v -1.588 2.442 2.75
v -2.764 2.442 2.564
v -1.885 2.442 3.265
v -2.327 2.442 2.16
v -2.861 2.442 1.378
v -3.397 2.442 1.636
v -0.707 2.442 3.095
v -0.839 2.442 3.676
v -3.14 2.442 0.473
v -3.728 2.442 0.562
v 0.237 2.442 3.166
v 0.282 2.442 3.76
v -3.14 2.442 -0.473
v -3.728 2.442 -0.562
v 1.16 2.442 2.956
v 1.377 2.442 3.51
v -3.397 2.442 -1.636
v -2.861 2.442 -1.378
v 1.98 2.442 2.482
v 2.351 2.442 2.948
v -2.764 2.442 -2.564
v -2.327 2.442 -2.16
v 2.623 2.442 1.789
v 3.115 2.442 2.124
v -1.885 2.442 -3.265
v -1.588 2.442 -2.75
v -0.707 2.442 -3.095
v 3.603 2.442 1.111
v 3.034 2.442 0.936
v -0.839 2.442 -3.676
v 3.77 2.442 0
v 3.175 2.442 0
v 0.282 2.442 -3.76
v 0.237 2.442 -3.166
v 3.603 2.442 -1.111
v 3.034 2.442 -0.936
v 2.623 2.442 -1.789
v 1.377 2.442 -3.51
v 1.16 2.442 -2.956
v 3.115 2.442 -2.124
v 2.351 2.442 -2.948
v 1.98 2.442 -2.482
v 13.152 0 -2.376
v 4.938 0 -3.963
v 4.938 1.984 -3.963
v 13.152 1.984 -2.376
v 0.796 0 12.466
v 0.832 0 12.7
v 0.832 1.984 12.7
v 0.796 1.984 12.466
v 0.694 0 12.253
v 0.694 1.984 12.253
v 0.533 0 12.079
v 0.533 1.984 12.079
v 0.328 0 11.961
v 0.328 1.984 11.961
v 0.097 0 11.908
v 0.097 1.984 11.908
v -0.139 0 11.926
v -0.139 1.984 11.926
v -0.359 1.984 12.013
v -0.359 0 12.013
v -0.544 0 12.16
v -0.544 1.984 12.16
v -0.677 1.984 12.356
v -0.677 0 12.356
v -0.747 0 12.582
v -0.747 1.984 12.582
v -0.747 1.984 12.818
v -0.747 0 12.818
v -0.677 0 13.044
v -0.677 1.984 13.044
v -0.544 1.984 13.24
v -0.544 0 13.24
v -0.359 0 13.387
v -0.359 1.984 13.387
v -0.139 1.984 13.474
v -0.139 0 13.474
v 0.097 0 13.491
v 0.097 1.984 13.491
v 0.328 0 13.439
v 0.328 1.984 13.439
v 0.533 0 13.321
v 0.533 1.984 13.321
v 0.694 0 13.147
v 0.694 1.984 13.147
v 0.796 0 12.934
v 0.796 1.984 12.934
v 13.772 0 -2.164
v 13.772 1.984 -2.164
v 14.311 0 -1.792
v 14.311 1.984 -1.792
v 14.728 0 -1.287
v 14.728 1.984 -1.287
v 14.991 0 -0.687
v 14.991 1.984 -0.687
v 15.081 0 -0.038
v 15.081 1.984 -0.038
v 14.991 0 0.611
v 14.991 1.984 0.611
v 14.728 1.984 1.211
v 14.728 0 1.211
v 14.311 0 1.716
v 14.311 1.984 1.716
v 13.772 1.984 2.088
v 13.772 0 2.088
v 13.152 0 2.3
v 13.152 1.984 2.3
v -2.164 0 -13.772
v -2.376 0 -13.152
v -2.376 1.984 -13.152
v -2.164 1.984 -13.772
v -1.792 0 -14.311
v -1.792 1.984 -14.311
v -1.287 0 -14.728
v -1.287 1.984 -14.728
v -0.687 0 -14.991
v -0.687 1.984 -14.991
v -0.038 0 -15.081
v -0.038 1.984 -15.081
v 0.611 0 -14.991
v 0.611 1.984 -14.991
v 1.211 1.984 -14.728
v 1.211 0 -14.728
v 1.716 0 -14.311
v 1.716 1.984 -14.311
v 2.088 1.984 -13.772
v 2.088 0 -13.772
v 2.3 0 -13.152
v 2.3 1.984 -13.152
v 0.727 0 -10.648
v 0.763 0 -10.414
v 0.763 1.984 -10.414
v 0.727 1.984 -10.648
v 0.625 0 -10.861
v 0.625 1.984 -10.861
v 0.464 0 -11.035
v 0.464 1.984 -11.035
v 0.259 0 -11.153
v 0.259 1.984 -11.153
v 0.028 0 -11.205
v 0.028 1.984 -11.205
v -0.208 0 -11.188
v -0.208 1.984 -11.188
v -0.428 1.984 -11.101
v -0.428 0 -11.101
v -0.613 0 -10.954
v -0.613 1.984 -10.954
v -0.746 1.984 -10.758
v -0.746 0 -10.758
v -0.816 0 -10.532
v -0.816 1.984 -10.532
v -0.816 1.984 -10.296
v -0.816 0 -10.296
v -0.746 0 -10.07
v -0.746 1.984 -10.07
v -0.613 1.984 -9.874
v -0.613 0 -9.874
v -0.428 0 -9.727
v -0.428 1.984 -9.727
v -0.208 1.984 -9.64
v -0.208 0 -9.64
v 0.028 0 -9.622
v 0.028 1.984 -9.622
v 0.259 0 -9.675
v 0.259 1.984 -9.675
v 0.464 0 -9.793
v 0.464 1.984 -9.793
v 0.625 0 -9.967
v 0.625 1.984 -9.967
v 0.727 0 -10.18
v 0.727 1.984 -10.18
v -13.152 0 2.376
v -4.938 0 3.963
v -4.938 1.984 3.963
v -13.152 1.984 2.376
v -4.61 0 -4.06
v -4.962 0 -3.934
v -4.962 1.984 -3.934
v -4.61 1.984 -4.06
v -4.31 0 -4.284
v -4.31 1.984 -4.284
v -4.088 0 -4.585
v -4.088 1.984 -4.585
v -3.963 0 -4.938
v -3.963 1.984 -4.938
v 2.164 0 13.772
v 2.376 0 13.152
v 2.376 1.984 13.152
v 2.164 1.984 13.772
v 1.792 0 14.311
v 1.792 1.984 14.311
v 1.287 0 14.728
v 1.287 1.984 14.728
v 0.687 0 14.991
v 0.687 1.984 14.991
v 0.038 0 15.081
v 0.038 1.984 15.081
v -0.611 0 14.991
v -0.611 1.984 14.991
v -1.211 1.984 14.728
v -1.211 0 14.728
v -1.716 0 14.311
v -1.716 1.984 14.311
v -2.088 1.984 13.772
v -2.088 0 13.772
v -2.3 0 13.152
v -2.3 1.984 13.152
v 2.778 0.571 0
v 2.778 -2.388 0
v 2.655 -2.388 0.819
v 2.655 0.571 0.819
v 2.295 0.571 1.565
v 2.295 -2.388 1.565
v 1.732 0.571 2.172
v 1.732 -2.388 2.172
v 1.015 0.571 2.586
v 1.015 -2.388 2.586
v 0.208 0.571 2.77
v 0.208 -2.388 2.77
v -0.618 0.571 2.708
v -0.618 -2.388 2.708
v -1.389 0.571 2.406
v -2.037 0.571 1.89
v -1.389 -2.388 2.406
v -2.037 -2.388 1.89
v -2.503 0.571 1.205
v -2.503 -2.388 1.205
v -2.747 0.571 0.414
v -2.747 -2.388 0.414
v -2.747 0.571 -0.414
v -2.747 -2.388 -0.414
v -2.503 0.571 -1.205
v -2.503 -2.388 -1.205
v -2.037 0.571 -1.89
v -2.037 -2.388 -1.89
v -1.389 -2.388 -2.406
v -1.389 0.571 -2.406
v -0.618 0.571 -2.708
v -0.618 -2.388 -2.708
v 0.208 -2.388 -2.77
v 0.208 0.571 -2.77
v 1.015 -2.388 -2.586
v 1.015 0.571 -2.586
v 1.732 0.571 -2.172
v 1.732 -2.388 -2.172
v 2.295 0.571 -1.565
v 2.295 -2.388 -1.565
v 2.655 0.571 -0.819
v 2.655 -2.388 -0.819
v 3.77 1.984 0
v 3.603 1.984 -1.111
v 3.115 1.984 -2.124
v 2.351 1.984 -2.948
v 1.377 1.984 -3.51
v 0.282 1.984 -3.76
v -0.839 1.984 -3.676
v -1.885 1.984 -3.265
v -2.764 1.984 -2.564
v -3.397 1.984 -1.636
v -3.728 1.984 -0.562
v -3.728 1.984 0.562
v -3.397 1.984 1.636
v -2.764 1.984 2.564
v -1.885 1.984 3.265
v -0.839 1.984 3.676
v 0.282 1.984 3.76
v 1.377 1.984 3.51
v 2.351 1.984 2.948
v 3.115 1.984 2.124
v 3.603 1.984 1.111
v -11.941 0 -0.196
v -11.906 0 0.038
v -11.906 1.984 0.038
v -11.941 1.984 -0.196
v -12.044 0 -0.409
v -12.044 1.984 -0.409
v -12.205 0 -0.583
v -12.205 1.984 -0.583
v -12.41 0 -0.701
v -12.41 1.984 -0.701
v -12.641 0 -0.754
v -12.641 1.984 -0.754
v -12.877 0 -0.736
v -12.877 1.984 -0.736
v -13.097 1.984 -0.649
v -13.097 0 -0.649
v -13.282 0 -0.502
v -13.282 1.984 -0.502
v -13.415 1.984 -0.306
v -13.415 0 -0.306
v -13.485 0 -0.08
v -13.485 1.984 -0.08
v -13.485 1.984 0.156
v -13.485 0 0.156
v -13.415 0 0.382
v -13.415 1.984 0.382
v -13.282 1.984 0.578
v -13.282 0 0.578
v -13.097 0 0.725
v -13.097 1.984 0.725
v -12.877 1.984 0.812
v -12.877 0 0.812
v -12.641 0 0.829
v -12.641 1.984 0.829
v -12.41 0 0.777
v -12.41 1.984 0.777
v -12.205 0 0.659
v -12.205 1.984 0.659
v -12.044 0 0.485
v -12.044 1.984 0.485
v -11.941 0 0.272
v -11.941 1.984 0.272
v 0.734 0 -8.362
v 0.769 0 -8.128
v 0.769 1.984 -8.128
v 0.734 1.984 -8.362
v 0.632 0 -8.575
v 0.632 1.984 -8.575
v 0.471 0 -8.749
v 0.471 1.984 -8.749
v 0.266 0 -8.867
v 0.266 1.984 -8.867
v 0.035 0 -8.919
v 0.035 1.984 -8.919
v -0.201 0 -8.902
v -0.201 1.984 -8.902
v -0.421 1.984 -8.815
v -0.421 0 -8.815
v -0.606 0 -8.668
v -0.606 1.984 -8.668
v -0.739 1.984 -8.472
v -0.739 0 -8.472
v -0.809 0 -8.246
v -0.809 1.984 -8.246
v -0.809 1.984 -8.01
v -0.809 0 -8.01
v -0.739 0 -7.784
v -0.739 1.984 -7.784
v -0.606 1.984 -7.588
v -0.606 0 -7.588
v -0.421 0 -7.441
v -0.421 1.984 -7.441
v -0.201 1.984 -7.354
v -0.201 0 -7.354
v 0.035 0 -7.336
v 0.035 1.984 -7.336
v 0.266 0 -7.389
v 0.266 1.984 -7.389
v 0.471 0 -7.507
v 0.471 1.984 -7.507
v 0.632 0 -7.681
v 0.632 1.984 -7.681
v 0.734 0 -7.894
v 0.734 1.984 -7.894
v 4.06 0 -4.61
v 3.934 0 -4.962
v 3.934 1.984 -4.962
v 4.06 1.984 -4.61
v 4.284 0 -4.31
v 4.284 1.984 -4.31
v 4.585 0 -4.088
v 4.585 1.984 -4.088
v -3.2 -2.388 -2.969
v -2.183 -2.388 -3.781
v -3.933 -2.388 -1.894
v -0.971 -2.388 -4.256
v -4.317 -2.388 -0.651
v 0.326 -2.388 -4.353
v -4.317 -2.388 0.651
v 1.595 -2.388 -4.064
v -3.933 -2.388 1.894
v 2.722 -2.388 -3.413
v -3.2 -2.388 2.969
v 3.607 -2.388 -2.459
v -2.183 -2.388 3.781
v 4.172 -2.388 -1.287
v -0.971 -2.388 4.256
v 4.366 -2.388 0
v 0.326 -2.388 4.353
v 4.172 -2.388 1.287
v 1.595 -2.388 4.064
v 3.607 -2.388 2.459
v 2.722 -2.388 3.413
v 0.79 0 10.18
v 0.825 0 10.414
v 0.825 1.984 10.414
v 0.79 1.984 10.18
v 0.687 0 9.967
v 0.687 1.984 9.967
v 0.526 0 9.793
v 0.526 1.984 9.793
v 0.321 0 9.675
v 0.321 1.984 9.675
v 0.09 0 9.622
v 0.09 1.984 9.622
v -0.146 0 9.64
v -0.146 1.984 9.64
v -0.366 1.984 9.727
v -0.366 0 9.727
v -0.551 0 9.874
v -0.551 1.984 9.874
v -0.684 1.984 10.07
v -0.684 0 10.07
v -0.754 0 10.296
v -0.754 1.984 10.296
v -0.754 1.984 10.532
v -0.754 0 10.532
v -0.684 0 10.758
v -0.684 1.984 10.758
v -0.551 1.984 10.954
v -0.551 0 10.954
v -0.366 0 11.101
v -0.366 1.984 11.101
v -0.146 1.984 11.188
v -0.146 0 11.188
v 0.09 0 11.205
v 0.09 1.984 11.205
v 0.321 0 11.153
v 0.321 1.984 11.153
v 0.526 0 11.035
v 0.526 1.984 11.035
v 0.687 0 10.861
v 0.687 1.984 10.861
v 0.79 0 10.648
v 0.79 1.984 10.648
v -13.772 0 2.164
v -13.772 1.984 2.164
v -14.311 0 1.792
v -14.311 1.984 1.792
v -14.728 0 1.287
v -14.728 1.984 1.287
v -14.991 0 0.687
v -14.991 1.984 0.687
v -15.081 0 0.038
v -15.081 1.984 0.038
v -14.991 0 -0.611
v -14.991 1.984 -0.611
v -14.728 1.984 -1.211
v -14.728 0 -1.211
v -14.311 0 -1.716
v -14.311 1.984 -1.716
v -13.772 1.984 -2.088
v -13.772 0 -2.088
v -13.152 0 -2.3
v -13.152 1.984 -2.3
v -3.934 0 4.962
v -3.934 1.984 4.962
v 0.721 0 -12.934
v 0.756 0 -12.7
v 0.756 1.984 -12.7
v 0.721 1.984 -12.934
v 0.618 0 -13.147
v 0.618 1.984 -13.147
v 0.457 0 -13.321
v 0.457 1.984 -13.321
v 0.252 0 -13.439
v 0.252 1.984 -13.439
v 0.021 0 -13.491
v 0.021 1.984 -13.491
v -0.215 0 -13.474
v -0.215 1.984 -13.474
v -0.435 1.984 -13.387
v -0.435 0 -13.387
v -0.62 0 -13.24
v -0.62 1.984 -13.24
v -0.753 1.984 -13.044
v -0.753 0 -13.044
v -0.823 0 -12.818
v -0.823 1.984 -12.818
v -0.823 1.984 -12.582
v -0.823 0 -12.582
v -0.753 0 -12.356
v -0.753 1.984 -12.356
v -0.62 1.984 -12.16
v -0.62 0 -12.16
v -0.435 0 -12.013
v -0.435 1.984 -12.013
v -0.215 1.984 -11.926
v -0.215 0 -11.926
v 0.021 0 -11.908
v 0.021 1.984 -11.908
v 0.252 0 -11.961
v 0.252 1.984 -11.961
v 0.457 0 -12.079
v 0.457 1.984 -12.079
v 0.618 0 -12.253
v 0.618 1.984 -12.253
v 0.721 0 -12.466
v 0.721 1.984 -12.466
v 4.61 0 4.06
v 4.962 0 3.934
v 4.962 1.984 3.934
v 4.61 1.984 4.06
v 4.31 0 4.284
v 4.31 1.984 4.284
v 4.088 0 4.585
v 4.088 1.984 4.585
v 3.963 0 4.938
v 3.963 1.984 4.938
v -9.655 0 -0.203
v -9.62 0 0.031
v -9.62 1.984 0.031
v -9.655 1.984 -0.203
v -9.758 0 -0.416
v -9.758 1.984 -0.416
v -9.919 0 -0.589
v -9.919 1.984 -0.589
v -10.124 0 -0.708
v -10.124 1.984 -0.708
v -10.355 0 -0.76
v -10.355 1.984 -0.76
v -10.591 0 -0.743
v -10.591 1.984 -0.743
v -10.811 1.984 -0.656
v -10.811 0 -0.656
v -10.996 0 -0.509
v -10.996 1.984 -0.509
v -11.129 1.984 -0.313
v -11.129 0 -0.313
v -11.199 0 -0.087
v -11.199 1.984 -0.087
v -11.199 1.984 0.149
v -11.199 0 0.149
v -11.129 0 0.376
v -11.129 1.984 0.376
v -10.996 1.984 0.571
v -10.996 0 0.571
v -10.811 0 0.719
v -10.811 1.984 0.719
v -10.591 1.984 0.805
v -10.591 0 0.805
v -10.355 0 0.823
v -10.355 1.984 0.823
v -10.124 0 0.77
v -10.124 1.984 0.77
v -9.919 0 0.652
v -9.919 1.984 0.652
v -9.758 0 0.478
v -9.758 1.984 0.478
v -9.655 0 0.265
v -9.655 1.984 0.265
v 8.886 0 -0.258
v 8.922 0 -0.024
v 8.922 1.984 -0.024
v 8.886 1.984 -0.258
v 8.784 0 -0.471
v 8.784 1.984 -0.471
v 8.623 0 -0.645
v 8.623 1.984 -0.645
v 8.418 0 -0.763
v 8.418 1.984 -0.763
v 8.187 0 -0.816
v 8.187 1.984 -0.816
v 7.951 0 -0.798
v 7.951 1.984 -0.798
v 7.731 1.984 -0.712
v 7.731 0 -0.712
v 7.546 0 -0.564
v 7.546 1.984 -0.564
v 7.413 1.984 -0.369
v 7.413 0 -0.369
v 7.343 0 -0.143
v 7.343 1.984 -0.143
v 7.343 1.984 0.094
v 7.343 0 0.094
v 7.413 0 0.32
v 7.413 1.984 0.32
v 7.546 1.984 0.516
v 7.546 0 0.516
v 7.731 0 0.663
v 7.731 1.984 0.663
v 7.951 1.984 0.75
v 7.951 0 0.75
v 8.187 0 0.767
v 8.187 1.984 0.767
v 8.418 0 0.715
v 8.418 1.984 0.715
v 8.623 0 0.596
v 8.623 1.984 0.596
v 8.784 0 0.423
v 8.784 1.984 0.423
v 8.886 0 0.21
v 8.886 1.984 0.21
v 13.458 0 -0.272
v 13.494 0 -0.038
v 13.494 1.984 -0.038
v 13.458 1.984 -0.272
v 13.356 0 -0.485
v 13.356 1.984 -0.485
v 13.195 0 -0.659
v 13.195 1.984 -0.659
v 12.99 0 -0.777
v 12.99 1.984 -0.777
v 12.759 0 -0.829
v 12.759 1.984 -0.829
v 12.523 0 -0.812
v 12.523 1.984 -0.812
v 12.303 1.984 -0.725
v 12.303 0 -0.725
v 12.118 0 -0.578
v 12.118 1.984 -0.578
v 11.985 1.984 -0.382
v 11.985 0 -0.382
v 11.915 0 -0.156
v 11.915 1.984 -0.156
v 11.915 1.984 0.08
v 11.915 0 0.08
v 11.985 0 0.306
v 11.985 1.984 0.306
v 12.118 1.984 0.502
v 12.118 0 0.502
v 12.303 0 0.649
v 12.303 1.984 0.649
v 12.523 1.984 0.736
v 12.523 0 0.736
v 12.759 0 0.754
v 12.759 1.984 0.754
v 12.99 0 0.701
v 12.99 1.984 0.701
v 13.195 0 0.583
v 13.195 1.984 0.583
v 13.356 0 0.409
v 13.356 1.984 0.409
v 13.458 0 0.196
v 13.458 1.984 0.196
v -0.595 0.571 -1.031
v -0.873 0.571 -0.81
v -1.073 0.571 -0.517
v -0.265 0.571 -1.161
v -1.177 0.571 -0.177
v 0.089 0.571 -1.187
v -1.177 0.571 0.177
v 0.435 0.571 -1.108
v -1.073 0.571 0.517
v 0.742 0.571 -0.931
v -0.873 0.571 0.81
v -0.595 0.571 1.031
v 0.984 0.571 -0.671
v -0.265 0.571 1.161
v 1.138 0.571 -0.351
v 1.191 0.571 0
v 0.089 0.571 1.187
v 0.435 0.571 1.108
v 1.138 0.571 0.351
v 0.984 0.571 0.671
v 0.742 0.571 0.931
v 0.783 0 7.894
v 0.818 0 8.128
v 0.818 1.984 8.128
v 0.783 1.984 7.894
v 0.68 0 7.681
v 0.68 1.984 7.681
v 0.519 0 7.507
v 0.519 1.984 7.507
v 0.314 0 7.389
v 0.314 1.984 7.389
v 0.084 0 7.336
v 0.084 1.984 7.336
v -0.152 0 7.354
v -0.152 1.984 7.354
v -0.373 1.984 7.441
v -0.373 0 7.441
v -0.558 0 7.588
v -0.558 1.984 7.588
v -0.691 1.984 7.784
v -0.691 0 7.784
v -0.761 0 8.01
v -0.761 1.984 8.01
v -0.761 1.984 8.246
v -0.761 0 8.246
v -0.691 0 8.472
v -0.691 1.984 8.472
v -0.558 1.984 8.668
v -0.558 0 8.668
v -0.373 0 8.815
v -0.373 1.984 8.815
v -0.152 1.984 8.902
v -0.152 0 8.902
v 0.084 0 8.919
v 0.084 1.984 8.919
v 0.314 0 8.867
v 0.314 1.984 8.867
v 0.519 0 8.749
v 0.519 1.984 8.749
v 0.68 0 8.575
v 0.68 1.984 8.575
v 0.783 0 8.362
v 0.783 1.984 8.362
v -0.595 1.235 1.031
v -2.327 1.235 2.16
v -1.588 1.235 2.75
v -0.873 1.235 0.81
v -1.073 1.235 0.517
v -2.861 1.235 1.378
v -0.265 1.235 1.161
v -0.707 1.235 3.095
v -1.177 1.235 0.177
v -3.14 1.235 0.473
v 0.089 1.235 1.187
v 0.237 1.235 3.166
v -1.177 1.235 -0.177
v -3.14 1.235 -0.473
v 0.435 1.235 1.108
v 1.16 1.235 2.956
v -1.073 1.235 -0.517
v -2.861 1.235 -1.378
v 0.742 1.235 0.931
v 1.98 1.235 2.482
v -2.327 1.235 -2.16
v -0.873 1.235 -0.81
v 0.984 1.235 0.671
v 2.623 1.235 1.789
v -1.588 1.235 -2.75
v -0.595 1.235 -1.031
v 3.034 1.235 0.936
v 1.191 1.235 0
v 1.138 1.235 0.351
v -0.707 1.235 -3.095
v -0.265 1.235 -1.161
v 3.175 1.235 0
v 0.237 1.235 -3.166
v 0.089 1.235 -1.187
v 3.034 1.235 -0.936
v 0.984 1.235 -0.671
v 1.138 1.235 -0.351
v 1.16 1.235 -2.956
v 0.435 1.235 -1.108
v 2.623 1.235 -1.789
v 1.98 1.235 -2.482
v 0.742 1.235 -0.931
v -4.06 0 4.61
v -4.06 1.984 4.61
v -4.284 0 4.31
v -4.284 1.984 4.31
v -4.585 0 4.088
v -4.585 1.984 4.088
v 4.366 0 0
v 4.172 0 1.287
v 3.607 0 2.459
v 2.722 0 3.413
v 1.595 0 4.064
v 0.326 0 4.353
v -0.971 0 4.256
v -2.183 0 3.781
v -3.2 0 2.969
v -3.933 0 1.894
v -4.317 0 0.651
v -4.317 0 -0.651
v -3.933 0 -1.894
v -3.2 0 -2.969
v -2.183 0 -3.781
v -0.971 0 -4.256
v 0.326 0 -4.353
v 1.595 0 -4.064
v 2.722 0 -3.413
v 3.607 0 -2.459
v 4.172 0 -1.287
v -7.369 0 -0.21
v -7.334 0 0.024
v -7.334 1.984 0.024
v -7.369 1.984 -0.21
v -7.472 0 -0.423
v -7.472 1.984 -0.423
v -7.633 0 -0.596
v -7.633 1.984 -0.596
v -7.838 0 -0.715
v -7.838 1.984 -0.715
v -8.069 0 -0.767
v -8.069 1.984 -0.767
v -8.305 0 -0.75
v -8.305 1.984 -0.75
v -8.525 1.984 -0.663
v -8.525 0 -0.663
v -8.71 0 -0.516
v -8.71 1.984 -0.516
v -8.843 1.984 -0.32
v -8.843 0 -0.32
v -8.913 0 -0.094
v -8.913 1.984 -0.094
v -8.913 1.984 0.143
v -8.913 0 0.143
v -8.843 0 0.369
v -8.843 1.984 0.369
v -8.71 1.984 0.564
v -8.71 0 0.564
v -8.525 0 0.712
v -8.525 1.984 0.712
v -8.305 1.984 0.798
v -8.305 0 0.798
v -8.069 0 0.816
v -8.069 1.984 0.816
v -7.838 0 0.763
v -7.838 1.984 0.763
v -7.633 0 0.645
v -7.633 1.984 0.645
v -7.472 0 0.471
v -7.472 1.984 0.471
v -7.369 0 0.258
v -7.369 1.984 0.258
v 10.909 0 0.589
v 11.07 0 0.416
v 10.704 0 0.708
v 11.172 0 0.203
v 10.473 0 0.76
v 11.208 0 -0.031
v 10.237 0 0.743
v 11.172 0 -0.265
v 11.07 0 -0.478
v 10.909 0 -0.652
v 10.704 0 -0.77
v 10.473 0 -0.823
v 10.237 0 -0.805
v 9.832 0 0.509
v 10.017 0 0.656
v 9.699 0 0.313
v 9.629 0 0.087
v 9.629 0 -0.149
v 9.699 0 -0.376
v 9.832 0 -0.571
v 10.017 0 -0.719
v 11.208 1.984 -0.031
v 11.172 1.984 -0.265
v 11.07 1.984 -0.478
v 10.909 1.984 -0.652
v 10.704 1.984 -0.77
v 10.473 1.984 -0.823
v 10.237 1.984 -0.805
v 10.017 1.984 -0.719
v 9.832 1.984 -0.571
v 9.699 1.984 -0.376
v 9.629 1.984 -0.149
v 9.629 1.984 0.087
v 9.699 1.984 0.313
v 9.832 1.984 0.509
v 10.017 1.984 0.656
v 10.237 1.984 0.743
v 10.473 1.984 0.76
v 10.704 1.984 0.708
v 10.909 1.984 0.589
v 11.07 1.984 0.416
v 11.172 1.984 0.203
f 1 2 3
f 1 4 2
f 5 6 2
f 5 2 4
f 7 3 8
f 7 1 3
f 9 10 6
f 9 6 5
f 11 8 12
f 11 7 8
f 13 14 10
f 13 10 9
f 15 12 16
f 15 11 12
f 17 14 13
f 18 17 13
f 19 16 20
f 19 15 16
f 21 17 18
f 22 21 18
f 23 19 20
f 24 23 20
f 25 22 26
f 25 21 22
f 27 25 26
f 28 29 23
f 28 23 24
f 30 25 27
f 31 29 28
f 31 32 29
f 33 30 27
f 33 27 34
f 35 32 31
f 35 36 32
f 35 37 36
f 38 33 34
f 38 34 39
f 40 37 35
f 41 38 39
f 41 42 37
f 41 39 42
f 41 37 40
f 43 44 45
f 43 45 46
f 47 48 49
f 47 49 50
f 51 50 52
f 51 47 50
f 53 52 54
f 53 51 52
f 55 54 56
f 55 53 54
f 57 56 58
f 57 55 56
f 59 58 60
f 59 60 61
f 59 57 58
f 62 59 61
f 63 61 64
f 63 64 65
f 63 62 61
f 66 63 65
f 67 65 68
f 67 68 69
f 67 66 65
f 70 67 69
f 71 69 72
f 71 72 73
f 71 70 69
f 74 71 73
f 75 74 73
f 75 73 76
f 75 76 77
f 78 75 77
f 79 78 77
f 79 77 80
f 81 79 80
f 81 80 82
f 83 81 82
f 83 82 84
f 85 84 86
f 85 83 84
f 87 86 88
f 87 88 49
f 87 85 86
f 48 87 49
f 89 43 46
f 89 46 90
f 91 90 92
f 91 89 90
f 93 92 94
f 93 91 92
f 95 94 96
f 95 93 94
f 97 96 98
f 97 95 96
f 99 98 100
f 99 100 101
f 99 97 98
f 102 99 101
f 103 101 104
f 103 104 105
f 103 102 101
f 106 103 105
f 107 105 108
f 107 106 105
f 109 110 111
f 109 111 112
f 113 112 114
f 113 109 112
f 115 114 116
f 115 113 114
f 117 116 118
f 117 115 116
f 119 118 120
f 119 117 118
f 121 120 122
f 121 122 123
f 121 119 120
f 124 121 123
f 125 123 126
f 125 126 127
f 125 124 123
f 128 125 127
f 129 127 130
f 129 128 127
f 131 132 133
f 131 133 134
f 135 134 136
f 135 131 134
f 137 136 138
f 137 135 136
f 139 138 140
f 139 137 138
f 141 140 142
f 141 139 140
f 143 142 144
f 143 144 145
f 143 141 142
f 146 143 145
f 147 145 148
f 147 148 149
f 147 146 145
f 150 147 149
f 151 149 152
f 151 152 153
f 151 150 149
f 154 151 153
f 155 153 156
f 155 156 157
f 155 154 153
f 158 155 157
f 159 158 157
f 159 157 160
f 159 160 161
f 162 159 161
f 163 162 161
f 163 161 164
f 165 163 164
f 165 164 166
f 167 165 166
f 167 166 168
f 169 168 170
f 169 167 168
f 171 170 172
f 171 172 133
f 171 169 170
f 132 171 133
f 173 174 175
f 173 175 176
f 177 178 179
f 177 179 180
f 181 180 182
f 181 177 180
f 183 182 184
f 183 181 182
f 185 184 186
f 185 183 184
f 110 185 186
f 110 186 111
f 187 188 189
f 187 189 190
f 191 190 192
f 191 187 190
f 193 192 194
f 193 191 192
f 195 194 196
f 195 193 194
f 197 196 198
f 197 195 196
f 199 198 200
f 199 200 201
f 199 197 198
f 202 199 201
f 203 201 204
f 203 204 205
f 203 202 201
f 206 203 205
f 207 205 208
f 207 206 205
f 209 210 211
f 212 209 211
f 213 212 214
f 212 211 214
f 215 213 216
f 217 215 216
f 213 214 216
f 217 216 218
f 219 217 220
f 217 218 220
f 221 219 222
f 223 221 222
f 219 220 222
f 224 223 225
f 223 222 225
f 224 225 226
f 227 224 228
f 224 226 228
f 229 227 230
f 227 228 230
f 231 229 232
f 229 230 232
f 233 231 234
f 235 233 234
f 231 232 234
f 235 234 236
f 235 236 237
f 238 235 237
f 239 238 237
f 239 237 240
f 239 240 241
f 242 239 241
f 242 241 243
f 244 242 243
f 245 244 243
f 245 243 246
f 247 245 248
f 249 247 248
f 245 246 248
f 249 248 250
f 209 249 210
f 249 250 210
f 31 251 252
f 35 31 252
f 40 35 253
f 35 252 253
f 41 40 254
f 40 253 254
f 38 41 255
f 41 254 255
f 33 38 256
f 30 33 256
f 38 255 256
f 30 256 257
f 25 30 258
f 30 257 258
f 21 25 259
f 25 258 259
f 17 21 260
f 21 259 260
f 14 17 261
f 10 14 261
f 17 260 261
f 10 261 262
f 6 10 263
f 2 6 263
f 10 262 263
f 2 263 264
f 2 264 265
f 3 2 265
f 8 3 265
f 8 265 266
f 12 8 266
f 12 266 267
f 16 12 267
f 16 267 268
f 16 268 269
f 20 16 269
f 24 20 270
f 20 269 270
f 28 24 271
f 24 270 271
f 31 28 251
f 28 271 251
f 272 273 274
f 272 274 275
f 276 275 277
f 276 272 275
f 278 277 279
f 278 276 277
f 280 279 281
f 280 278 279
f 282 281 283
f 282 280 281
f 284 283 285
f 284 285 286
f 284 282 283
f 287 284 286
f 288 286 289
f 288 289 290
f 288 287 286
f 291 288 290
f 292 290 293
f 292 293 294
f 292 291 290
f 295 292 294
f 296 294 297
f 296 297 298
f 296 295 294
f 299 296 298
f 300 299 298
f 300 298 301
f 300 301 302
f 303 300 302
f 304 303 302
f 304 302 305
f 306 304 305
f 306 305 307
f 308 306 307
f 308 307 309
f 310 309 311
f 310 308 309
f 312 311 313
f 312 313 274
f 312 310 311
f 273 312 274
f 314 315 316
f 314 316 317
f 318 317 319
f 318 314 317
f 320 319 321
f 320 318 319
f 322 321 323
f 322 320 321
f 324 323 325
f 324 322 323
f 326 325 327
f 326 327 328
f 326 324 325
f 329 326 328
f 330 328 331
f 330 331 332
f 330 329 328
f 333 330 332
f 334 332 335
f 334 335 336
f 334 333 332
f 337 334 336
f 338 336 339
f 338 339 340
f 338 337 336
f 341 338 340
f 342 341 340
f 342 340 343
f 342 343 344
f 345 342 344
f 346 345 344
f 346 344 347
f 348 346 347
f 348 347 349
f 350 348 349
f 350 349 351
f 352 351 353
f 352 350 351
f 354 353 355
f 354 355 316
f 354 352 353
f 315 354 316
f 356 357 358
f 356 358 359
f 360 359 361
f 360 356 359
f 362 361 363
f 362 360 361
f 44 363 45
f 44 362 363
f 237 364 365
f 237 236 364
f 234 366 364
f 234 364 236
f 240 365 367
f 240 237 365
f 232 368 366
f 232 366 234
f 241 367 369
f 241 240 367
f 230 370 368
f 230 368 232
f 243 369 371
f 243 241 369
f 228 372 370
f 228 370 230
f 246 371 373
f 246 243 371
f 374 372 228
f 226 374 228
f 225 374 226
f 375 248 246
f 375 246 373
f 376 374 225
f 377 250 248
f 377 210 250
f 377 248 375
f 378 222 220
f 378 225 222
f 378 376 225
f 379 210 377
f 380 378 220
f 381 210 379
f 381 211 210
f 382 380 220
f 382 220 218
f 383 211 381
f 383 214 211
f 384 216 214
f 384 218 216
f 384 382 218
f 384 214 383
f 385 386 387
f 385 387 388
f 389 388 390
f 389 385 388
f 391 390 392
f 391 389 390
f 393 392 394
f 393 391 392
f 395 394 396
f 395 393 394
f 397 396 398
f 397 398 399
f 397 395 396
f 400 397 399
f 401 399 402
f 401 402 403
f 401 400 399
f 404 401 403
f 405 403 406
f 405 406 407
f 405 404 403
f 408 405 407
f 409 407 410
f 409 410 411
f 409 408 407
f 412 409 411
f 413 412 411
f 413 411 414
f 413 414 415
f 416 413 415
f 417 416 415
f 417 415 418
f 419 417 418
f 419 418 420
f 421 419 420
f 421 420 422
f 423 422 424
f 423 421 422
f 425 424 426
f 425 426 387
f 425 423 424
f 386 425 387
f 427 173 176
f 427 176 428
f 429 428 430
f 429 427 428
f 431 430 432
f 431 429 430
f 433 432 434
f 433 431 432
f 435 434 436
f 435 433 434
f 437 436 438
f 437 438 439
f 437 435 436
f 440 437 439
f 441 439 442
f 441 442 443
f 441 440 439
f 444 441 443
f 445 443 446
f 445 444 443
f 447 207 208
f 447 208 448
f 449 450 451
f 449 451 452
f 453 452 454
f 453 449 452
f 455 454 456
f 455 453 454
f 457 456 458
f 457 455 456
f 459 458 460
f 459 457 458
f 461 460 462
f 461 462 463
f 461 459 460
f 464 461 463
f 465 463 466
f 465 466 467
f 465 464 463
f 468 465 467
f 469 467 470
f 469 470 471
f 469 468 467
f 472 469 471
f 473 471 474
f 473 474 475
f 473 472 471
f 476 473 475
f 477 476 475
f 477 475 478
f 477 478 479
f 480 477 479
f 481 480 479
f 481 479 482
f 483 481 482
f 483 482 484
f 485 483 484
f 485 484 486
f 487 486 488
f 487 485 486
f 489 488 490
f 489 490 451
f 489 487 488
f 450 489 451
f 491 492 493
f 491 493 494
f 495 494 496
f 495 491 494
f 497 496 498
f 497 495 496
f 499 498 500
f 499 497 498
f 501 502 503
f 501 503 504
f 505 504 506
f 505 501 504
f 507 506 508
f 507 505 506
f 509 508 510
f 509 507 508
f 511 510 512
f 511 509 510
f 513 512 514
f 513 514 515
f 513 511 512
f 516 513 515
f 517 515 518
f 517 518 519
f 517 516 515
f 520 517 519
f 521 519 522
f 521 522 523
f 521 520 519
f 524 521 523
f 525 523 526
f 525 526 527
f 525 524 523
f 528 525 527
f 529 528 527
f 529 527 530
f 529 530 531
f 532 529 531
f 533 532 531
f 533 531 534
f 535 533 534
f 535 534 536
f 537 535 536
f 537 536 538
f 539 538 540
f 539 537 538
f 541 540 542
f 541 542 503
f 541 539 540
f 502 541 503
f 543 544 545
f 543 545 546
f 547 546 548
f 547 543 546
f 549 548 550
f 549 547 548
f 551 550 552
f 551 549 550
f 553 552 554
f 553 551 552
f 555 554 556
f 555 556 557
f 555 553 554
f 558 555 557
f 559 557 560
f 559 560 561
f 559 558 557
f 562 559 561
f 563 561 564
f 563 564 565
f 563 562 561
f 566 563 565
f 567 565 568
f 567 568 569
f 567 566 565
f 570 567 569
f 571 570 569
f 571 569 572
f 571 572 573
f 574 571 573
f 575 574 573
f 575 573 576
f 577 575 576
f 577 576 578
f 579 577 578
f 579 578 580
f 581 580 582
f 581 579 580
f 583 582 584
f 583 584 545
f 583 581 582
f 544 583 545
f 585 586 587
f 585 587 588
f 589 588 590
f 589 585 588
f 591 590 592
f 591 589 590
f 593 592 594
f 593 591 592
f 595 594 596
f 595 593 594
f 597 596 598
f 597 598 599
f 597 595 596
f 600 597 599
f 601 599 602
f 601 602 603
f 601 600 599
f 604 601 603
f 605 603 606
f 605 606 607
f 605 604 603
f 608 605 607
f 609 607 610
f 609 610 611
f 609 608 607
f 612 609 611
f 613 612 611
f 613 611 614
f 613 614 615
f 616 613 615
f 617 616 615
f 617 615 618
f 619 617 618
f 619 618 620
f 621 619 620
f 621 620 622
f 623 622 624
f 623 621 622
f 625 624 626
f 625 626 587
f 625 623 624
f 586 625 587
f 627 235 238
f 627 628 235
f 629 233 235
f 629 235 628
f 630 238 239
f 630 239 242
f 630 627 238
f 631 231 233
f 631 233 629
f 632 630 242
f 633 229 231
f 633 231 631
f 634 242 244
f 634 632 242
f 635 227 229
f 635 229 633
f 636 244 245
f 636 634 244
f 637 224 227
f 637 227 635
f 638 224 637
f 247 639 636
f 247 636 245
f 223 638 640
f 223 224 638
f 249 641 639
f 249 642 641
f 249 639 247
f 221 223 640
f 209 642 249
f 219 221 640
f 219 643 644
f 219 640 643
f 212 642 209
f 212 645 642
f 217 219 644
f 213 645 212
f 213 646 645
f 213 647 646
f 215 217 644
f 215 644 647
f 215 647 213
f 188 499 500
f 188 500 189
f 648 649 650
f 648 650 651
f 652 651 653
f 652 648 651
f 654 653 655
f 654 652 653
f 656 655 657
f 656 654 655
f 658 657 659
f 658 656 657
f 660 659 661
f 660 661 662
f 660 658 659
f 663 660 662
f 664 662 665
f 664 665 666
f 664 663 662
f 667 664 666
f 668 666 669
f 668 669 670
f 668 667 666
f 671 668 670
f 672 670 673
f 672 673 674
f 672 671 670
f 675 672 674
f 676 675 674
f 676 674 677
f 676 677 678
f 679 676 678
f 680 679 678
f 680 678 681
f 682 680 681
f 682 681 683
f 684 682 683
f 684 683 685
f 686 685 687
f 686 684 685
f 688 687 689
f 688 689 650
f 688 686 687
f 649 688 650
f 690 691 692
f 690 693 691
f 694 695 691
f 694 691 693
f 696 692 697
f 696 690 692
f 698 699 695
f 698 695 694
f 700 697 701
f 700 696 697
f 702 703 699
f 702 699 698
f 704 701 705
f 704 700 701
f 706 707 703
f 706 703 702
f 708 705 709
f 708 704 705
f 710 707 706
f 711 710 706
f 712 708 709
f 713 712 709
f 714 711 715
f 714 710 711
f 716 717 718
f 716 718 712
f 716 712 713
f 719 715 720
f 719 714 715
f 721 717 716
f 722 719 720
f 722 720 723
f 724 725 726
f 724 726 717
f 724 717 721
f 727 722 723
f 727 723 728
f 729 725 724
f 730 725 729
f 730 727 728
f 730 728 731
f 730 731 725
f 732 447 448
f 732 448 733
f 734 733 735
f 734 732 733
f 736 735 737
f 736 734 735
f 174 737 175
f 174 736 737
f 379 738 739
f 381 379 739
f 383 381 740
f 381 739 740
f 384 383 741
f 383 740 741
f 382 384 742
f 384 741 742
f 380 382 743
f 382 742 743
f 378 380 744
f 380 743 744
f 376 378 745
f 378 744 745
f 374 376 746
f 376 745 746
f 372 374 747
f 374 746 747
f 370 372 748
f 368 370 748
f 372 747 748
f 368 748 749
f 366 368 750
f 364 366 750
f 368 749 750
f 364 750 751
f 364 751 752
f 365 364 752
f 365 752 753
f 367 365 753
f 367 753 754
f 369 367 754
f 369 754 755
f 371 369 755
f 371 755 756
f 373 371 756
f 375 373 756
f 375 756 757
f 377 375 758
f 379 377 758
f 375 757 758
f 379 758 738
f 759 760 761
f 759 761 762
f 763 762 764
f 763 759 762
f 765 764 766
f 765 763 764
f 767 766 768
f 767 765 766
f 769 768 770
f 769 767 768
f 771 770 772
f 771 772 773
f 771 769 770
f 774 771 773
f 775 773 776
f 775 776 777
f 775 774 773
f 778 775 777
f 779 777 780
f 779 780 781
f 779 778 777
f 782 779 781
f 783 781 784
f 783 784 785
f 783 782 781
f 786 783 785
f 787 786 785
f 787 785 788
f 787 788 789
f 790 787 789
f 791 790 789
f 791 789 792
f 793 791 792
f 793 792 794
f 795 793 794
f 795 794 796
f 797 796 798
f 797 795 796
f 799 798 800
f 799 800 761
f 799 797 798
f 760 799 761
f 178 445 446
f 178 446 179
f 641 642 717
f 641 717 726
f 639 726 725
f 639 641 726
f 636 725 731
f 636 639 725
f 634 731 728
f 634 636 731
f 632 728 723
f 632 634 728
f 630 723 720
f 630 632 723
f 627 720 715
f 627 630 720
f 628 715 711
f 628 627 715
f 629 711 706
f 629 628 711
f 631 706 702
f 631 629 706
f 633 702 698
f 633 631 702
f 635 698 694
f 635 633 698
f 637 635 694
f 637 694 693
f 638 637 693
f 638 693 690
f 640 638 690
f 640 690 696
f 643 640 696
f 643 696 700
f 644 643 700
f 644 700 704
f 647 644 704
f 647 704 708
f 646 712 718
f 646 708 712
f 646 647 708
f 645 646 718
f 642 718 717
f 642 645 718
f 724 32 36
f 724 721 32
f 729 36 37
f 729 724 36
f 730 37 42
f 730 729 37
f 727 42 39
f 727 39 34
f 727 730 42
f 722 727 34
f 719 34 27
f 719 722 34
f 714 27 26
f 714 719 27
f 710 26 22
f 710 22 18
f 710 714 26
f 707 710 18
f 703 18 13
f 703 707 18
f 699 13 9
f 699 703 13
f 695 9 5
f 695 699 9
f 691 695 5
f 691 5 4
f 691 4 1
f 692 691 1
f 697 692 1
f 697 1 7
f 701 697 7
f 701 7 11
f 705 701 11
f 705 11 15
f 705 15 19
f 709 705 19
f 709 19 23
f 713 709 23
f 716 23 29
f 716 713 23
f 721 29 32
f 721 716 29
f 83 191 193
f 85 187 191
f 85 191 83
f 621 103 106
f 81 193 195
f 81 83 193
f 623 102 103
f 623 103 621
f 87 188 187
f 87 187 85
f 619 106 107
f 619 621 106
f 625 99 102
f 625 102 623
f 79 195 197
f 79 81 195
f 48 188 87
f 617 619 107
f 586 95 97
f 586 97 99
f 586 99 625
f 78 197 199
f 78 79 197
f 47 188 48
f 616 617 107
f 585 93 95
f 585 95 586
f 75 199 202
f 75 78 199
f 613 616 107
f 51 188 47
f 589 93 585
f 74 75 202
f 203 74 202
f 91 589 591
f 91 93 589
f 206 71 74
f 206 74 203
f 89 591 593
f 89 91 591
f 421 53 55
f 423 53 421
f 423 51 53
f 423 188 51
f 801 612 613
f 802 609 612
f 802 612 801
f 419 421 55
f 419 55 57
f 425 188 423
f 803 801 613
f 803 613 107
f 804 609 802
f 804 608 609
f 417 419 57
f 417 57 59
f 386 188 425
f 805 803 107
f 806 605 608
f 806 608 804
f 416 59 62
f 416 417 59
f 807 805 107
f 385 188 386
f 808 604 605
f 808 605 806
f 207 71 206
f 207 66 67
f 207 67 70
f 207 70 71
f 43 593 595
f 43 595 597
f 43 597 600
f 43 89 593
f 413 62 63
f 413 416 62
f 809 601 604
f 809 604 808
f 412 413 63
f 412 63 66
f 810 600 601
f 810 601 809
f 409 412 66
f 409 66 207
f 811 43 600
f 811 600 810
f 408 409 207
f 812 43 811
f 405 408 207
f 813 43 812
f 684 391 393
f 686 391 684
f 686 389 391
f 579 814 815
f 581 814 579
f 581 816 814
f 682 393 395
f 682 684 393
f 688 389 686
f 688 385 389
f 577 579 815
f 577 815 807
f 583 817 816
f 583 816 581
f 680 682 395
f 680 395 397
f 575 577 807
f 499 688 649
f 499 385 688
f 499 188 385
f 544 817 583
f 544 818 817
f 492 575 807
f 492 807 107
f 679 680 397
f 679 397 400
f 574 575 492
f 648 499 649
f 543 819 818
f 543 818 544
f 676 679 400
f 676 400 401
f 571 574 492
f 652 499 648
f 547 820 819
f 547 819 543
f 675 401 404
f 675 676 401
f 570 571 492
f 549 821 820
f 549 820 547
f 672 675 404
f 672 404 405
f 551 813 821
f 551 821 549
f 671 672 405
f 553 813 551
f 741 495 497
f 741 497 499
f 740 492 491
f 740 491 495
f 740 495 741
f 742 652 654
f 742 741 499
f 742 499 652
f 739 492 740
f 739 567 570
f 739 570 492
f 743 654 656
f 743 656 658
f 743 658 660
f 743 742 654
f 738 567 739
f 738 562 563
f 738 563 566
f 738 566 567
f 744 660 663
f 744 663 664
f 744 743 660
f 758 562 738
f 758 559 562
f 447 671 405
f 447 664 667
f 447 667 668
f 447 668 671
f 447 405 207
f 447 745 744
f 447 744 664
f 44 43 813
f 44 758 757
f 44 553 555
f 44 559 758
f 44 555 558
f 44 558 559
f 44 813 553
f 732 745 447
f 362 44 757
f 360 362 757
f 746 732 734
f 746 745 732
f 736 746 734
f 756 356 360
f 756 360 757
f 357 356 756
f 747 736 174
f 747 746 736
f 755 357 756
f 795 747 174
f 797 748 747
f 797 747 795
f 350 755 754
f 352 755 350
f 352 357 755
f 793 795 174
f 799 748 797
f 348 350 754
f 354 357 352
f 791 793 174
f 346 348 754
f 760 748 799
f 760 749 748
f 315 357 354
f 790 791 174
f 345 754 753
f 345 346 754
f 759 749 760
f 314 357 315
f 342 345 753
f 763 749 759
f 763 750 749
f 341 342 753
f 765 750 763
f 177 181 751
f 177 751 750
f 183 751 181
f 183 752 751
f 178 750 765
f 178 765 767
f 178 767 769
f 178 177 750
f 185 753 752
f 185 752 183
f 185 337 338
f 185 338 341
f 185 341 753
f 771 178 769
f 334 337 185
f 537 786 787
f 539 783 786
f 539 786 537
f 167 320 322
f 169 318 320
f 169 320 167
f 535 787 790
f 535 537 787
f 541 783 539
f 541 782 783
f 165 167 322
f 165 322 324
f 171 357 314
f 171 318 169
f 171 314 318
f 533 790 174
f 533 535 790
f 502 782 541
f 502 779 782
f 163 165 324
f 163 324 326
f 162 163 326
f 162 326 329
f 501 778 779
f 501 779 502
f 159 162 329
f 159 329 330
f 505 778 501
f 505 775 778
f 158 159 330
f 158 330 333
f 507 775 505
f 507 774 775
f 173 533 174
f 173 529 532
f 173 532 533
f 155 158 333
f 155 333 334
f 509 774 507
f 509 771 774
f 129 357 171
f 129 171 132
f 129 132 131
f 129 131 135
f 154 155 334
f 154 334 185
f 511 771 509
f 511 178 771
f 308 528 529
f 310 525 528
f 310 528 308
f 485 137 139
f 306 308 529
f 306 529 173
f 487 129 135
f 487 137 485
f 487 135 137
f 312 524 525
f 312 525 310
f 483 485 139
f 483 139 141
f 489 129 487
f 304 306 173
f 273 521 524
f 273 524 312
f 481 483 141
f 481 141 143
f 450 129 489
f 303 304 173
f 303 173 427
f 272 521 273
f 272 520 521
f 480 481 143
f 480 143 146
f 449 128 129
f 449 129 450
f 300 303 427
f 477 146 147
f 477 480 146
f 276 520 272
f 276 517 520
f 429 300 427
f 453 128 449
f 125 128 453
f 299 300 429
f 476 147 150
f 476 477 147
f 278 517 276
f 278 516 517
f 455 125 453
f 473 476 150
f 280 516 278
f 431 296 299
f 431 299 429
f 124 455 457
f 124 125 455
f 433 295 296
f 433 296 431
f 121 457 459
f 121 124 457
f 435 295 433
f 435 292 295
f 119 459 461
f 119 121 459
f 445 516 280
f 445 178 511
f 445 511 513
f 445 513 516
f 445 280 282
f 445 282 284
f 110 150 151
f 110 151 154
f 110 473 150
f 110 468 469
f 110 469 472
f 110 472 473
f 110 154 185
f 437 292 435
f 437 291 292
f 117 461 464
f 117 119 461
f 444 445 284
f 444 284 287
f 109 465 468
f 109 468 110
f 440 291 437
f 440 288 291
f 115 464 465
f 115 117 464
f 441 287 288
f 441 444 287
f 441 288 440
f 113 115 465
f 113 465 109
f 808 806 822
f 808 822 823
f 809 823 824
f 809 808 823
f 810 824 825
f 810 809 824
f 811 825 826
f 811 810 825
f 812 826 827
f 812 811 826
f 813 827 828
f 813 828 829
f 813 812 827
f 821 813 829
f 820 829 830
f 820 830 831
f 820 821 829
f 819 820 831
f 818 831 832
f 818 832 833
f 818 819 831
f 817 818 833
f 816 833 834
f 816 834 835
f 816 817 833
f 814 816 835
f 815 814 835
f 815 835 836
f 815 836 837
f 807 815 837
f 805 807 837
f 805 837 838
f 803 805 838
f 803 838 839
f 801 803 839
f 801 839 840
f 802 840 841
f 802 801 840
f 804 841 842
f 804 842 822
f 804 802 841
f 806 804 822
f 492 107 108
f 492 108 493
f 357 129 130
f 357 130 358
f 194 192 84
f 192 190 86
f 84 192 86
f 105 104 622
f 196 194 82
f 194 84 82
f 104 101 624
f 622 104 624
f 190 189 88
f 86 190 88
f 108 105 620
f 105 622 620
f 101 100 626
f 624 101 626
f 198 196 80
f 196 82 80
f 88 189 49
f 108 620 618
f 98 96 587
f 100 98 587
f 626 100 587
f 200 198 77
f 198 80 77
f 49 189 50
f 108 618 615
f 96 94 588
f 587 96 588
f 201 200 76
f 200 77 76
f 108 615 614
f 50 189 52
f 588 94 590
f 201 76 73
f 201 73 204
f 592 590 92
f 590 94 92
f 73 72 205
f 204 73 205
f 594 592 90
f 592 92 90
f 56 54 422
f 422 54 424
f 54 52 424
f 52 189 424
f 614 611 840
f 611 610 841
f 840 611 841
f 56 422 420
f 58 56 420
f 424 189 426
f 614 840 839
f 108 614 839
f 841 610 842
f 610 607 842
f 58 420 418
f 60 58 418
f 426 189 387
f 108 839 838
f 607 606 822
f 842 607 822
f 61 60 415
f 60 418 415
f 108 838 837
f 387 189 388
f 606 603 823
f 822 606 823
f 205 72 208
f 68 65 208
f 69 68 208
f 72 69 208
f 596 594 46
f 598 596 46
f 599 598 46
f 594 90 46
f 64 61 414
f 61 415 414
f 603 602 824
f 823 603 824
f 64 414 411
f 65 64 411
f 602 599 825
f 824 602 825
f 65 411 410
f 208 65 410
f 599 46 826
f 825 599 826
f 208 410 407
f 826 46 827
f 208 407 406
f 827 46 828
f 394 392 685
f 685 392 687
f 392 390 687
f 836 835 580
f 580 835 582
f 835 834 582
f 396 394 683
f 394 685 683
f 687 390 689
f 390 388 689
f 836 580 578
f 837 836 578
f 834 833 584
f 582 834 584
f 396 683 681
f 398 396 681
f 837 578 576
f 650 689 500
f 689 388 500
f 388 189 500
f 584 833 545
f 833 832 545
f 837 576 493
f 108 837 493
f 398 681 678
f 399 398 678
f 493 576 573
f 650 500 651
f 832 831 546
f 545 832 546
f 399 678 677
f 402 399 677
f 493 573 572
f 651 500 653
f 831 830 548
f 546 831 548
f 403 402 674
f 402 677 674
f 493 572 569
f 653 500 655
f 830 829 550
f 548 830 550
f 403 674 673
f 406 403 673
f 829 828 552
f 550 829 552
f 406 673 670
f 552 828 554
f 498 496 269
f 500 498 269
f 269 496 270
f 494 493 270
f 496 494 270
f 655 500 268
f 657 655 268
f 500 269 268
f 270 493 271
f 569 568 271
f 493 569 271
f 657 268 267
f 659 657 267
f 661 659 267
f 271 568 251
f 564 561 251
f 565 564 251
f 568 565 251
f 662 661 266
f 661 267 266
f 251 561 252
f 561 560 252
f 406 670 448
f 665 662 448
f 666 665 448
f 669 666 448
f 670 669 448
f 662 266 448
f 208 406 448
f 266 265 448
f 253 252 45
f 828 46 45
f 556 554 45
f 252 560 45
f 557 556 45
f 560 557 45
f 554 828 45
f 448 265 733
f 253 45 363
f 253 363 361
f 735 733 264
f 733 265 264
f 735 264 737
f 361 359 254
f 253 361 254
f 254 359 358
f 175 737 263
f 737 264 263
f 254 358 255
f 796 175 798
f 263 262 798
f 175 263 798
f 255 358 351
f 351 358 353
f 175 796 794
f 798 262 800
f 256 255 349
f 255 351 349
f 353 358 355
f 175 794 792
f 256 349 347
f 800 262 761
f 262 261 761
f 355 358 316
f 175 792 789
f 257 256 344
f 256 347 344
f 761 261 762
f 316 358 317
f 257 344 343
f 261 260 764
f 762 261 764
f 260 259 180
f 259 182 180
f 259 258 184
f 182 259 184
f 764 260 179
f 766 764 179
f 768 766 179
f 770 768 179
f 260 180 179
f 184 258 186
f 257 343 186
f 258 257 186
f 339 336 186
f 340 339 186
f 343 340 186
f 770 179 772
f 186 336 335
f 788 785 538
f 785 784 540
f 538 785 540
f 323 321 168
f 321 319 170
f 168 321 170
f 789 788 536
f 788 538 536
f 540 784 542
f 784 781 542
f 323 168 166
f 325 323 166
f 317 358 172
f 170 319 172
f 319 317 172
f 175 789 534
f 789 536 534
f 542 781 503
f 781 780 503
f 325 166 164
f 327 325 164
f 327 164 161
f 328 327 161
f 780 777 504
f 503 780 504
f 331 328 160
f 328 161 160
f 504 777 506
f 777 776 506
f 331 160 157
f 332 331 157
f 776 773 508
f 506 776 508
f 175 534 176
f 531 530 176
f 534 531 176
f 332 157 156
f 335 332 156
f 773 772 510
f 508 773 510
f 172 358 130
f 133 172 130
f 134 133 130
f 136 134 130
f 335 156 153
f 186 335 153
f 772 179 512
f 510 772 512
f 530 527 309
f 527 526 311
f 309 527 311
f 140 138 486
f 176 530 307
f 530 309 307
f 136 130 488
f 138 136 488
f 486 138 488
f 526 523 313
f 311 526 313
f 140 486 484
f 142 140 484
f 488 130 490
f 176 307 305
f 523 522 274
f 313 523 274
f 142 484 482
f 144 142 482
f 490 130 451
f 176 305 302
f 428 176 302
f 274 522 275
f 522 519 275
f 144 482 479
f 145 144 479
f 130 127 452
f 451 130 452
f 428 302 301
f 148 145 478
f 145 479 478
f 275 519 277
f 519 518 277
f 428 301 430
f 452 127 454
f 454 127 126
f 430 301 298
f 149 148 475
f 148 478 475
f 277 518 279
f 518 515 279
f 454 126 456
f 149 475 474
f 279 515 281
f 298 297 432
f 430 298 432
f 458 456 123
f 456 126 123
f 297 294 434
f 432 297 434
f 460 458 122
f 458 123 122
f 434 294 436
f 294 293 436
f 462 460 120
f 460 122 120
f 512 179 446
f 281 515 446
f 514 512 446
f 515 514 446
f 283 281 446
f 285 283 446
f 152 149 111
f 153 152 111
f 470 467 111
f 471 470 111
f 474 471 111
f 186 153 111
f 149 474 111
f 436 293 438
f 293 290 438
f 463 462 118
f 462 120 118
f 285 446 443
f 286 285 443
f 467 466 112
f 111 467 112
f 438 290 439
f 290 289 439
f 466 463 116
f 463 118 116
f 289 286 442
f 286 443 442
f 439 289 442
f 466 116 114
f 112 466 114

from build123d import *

# Parameters (mm, degrees)
SKETCH1_R           = 1.190625
SKETCH1_R_2         = 0.79375
BOSS_EXTRUDE1_DEPTH = 1.984375
SKETCH2_R           = 3.175
CUT_EXTRUDE1_DEPTH  = 0.7493
SKETCH3_R           = 4.365625
BOSS_EXTRUDE2_DEPTH = 2.3876
SKETCH4_R           = 2.778125
CUT_EXTRUDE2_DEPTH  = 2.9591
SKETCH5_R           = 3.7703125
SKETCH5_R_2         = 3.175
BOSS_EXTRUDE3_DEPTH = 0.4572


with BuildPart() as part:
    # Sketch1 → Boss-Extrude1 (new body)
    with BuildSketch(Plane(origin=(0, 0, 0), x_dir=(1, 0, 0), z_dir=(0, 1, 0))):
        with BuildLine():
            Line((-3.96335347, 4.938233395), (-2.375942501, 13.151798758))
            ThreePointArc((-2.375942501, 13.151798758), (-0.037956575, 15.081193279), (2.300029351, 13.151798758))
            Line((2.300029351, 13.151798758), (3.933761069, 4.9618349))
            ThreePointArc((3.933761069, 4.9618349), (4.283887399, 4.309571692), (4.938233395, 3.96335347))
            Line((4.938233395, 3.96335347), (13.151798758, 2.375942501))
            ThreePointArc((13.151798758, 2.375942501), (15.081193279, 0.037956575), (13.151798758, -2.300029351))
            Line((13.151798758, -2.300029351), (4.9618349, -3.933761069))
            ThreePointArc((4.9618349, -3.933761069), (4.309571692, -4.283887399), (3.96335347, -4.938233395))
            Line((3.96335347, -4.938233395), (2.375942501, -13.151798758))
            ThreePointArc((2.375942501, -13.151798758), (0.037956575, -15.081193279), (-2.300029351, -13.151798758))
            Line((-2.300029351, -13.151798758), (-3.933761069, -4.9618349))
            ThreePointArc((-3.933761069, -4.9618349), (-4.283887399, -4.309571692), (-4.938233395, -3.96335347))
            Line((-4.938233395, -3.96335347), (-13.151798758, -2.375942501))
            ThreePointArc((-13.151798758, -2.375942501), (-15.081193279, -0.037956575), (-13.151798758, 2.300029351))
            Line((-13.151798758, 2.300029351), (-4.9618349, 3.933761069))
            ThreePointArc((-4.9618349, 3.933761069), (-4.309571692, 4.283887399), (-3.96335347, 4.938233395))
        make_face()
        Circle(SKETCH1_R, mode=Mode.SUBTRACT)
        with Locations((-0.037956575, 12.699943279)):
            Circle(SKETCH1_R_2, mode=Mode.SUBTRACT)
        with Locations((-0.031124391, 10.413953489)):
            Circle(SKETCH1_R_2, mode=Mode.SUBTRACT)
        with Locations((-0.024292208, 8.127963699)):
            Circle(SKETCH1_R_2, mode=Mode.SUBTRACT)
        with Locations((12.699943279, 0.037956575)):
            Circle(SKETCH1_R_2, mode=Mode.SUBTRACT)
        with Locations((10.413953489, 0.031124391)):
            Circle(SKETCH1_R_2, mode=Mode.SUBTRACT)
        with Locations((8.127963699, 0.024292208)):
            Circle(SKETCH1_R_2, mode=Mode.SUBTRACT)
        with Locations((0.037956575, -12.699943279)):
            Circle(SKETCH1_R_2, mode=Mode.SUBTRACT)
        with Locations((0.031124391, -10.413953489)):
            Circle(SKETCH1_R_2, mode=Mode.SUBTRACT)
        with Locations((0.024292208, -8.127963699)):
            Circle(SKETCH1_R_2, mode=Mode.SUBTRACT)
        with Locations((-12.699943279, -0.037956575)):
            Circle(SKETCH1_R_2, mode=Mode.SUBTRACT)
        with Locations((-10.413953489, -0.031124391)):
            Circle(SKETCH1_R_2, mode=Mode.SUBTRACT)
        with Locations((-8.127963699, -0.024292208)):
            Circle(SKETCH1_R_2, mode=Mode.SUBTRACT)
    extrude(amount=BOSS_EXTRUDE1_DEPTH)

    # Sketch2 → Cut-Extrude1 (cut)
    with BuildSketch(Plane(origin=(0, 1.984375, 0), x_dir=(1, 0, 0), z_dir=(0, 1, 0))):
        Circle(SKETCH2_R)
    extrude(amount=-CUT_EXTRUDE1_DEPTH, mode=Mode.SUBTRACT)

    # Sketch3 → Boss-Extrude2 (add)
    with BuildSketch(Plane.XZ):
        Circle(SKETCH3_R)
    extrude(amount=BOSS_EXTRUDE2_DEPTH)

    # Sketch4 → Cut-Extrude2 (cut)
    with BuildSketch(Plane.XZ.offset(2.3876)):
        Circle(SKETCH4_R)
    extrude(amount=-CUT_EXTRUDE2_DEPTH, mode=Mode.SUBTRACT)

    # Sketch5 → Boss-Extrude3 (add)
    with BuildSketch(Plane(origin=(0, 1.984375, 0), x_dir=(1, 0, 0), z_dir=(0, 1, 0))):
        Circle(SKETCH5_R)
        Circle(SKETCH5_R_2, mode=Mode.SUBTRACT)
    extrude(amount=BOSS_EXTRUDE3_DEPTH)


solid = part.part
